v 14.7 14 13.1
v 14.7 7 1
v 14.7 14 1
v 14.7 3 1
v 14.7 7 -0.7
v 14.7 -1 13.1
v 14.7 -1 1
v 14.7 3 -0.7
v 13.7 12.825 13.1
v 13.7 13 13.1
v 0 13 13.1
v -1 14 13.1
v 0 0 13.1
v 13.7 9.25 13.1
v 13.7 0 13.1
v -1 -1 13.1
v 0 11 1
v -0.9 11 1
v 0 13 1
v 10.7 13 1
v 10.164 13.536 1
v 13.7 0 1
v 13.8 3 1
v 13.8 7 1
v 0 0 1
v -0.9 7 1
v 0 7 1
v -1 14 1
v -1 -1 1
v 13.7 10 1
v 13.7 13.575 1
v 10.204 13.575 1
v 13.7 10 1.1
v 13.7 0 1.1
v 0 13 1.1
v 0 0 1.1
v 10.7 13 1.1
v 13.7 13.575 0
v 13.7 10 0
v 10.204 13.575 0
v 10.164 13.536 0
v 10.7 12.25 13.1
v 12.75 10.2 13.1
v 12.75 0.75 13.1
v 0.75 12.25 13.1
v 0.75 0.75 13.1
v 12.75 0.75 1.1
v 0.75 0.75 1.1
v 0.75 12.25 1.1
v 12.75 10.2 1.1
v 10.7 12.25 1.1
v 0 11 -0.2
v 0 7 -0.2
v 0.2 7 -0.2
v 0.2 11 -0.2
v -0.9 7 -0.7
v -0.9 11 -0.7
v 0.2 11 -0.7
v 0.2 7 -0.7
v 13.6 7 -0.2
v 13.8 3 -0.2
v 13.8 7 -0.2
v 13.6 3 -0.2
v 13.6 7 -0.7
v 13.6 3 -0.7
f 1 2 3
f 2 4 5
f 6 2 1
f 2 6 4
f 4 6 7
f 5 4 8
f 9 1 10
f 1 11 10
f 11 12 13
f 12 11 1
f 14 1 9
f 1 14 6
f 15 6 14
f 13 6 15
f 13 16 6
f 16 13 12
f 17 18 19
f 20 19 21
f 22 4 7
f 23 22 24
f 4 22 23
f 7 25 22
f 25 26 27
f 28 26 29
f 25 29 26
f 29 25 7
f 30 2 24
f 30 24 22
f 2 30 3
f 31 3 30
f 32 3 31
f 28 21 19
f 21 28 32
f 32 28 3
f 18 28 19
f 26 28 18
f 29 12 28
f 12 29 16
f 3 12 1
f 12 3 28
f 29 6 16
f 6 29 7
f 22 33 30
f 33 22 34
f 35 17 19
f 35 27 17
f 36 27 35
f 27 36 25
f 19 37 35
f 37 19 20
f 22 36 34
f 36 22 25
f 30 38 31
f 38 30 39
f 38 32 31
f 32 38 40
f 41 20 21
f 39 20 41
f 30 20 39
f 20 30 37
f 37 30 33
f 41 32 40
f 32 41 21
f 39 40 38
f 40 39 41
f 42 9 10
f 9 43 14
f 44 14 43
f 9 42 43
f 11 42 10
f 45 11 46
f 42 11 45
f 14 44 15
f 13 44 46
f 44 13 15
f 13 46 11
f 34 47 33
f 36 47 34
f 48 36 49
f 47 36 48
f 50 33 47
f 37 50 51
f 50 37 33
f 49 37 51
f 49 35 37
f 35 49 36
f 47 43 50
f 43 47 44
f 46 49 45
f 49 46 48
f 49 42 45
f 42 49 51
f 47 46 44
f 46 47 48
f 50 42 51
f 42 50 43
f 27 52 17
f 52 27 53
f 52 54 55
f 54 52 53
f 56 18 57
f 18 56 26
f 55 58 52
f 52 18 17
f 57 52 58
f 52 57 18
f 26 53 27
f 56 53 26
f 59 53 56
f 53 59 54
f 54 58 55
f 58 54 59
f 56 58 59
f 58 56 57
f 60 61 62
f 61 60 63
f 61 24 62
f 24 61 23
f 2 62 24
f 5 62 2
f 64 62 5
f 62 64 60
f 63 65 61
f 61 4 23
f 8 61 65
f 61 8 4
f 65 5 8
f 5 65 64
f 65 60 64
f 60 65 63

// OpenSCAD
$fn = 100;

translate([0,0,1]){
difference(){

translate([-1,-1,0]){
cube([13.7+2,13+2,12.1]);
}
translate([0,0,-5]){
cube([13.7, 13, 40]);
}


}

translate([13.7,10,-1]){
difference(){
rotate([0,0,45]){
cube([5,5,10]);
}
translate([0,0,-2]){
cube([10,10,15]);
translate([-5,3.575,0]){
cube([10,10,15]);
}
}
}
}
}

translate([-0.9,7,-0.2]){
cube([0.9,4,1.2]);
}
translate([-0.9,7,-0.7]){
cube([1.1,4,0.5]);
}

translate([13.8,3,-0.2]){
cube([0.9,4,1.2]);
}
translate([13.6,3,-0.7]){
cube([1.1,4,0.5]);
}

//color("green"){
//headpost();
//}

 difference(){

translate([0,0,1.1]){
difference(){
cube([13.7,13,12]);
translate([0.75,0.75,-2]){
cube([12,11.5,18]);
}
}
}
}

translate([13.7,9.25,1.1]){
difference(){
rotate([0,0,45]){
cube([5,5,12]);
}
translate([0,0,-2]){
cube([10,10,15]);
translate([-5,3.575,0]){
cube([10,10,15]);
}
}
}
}
